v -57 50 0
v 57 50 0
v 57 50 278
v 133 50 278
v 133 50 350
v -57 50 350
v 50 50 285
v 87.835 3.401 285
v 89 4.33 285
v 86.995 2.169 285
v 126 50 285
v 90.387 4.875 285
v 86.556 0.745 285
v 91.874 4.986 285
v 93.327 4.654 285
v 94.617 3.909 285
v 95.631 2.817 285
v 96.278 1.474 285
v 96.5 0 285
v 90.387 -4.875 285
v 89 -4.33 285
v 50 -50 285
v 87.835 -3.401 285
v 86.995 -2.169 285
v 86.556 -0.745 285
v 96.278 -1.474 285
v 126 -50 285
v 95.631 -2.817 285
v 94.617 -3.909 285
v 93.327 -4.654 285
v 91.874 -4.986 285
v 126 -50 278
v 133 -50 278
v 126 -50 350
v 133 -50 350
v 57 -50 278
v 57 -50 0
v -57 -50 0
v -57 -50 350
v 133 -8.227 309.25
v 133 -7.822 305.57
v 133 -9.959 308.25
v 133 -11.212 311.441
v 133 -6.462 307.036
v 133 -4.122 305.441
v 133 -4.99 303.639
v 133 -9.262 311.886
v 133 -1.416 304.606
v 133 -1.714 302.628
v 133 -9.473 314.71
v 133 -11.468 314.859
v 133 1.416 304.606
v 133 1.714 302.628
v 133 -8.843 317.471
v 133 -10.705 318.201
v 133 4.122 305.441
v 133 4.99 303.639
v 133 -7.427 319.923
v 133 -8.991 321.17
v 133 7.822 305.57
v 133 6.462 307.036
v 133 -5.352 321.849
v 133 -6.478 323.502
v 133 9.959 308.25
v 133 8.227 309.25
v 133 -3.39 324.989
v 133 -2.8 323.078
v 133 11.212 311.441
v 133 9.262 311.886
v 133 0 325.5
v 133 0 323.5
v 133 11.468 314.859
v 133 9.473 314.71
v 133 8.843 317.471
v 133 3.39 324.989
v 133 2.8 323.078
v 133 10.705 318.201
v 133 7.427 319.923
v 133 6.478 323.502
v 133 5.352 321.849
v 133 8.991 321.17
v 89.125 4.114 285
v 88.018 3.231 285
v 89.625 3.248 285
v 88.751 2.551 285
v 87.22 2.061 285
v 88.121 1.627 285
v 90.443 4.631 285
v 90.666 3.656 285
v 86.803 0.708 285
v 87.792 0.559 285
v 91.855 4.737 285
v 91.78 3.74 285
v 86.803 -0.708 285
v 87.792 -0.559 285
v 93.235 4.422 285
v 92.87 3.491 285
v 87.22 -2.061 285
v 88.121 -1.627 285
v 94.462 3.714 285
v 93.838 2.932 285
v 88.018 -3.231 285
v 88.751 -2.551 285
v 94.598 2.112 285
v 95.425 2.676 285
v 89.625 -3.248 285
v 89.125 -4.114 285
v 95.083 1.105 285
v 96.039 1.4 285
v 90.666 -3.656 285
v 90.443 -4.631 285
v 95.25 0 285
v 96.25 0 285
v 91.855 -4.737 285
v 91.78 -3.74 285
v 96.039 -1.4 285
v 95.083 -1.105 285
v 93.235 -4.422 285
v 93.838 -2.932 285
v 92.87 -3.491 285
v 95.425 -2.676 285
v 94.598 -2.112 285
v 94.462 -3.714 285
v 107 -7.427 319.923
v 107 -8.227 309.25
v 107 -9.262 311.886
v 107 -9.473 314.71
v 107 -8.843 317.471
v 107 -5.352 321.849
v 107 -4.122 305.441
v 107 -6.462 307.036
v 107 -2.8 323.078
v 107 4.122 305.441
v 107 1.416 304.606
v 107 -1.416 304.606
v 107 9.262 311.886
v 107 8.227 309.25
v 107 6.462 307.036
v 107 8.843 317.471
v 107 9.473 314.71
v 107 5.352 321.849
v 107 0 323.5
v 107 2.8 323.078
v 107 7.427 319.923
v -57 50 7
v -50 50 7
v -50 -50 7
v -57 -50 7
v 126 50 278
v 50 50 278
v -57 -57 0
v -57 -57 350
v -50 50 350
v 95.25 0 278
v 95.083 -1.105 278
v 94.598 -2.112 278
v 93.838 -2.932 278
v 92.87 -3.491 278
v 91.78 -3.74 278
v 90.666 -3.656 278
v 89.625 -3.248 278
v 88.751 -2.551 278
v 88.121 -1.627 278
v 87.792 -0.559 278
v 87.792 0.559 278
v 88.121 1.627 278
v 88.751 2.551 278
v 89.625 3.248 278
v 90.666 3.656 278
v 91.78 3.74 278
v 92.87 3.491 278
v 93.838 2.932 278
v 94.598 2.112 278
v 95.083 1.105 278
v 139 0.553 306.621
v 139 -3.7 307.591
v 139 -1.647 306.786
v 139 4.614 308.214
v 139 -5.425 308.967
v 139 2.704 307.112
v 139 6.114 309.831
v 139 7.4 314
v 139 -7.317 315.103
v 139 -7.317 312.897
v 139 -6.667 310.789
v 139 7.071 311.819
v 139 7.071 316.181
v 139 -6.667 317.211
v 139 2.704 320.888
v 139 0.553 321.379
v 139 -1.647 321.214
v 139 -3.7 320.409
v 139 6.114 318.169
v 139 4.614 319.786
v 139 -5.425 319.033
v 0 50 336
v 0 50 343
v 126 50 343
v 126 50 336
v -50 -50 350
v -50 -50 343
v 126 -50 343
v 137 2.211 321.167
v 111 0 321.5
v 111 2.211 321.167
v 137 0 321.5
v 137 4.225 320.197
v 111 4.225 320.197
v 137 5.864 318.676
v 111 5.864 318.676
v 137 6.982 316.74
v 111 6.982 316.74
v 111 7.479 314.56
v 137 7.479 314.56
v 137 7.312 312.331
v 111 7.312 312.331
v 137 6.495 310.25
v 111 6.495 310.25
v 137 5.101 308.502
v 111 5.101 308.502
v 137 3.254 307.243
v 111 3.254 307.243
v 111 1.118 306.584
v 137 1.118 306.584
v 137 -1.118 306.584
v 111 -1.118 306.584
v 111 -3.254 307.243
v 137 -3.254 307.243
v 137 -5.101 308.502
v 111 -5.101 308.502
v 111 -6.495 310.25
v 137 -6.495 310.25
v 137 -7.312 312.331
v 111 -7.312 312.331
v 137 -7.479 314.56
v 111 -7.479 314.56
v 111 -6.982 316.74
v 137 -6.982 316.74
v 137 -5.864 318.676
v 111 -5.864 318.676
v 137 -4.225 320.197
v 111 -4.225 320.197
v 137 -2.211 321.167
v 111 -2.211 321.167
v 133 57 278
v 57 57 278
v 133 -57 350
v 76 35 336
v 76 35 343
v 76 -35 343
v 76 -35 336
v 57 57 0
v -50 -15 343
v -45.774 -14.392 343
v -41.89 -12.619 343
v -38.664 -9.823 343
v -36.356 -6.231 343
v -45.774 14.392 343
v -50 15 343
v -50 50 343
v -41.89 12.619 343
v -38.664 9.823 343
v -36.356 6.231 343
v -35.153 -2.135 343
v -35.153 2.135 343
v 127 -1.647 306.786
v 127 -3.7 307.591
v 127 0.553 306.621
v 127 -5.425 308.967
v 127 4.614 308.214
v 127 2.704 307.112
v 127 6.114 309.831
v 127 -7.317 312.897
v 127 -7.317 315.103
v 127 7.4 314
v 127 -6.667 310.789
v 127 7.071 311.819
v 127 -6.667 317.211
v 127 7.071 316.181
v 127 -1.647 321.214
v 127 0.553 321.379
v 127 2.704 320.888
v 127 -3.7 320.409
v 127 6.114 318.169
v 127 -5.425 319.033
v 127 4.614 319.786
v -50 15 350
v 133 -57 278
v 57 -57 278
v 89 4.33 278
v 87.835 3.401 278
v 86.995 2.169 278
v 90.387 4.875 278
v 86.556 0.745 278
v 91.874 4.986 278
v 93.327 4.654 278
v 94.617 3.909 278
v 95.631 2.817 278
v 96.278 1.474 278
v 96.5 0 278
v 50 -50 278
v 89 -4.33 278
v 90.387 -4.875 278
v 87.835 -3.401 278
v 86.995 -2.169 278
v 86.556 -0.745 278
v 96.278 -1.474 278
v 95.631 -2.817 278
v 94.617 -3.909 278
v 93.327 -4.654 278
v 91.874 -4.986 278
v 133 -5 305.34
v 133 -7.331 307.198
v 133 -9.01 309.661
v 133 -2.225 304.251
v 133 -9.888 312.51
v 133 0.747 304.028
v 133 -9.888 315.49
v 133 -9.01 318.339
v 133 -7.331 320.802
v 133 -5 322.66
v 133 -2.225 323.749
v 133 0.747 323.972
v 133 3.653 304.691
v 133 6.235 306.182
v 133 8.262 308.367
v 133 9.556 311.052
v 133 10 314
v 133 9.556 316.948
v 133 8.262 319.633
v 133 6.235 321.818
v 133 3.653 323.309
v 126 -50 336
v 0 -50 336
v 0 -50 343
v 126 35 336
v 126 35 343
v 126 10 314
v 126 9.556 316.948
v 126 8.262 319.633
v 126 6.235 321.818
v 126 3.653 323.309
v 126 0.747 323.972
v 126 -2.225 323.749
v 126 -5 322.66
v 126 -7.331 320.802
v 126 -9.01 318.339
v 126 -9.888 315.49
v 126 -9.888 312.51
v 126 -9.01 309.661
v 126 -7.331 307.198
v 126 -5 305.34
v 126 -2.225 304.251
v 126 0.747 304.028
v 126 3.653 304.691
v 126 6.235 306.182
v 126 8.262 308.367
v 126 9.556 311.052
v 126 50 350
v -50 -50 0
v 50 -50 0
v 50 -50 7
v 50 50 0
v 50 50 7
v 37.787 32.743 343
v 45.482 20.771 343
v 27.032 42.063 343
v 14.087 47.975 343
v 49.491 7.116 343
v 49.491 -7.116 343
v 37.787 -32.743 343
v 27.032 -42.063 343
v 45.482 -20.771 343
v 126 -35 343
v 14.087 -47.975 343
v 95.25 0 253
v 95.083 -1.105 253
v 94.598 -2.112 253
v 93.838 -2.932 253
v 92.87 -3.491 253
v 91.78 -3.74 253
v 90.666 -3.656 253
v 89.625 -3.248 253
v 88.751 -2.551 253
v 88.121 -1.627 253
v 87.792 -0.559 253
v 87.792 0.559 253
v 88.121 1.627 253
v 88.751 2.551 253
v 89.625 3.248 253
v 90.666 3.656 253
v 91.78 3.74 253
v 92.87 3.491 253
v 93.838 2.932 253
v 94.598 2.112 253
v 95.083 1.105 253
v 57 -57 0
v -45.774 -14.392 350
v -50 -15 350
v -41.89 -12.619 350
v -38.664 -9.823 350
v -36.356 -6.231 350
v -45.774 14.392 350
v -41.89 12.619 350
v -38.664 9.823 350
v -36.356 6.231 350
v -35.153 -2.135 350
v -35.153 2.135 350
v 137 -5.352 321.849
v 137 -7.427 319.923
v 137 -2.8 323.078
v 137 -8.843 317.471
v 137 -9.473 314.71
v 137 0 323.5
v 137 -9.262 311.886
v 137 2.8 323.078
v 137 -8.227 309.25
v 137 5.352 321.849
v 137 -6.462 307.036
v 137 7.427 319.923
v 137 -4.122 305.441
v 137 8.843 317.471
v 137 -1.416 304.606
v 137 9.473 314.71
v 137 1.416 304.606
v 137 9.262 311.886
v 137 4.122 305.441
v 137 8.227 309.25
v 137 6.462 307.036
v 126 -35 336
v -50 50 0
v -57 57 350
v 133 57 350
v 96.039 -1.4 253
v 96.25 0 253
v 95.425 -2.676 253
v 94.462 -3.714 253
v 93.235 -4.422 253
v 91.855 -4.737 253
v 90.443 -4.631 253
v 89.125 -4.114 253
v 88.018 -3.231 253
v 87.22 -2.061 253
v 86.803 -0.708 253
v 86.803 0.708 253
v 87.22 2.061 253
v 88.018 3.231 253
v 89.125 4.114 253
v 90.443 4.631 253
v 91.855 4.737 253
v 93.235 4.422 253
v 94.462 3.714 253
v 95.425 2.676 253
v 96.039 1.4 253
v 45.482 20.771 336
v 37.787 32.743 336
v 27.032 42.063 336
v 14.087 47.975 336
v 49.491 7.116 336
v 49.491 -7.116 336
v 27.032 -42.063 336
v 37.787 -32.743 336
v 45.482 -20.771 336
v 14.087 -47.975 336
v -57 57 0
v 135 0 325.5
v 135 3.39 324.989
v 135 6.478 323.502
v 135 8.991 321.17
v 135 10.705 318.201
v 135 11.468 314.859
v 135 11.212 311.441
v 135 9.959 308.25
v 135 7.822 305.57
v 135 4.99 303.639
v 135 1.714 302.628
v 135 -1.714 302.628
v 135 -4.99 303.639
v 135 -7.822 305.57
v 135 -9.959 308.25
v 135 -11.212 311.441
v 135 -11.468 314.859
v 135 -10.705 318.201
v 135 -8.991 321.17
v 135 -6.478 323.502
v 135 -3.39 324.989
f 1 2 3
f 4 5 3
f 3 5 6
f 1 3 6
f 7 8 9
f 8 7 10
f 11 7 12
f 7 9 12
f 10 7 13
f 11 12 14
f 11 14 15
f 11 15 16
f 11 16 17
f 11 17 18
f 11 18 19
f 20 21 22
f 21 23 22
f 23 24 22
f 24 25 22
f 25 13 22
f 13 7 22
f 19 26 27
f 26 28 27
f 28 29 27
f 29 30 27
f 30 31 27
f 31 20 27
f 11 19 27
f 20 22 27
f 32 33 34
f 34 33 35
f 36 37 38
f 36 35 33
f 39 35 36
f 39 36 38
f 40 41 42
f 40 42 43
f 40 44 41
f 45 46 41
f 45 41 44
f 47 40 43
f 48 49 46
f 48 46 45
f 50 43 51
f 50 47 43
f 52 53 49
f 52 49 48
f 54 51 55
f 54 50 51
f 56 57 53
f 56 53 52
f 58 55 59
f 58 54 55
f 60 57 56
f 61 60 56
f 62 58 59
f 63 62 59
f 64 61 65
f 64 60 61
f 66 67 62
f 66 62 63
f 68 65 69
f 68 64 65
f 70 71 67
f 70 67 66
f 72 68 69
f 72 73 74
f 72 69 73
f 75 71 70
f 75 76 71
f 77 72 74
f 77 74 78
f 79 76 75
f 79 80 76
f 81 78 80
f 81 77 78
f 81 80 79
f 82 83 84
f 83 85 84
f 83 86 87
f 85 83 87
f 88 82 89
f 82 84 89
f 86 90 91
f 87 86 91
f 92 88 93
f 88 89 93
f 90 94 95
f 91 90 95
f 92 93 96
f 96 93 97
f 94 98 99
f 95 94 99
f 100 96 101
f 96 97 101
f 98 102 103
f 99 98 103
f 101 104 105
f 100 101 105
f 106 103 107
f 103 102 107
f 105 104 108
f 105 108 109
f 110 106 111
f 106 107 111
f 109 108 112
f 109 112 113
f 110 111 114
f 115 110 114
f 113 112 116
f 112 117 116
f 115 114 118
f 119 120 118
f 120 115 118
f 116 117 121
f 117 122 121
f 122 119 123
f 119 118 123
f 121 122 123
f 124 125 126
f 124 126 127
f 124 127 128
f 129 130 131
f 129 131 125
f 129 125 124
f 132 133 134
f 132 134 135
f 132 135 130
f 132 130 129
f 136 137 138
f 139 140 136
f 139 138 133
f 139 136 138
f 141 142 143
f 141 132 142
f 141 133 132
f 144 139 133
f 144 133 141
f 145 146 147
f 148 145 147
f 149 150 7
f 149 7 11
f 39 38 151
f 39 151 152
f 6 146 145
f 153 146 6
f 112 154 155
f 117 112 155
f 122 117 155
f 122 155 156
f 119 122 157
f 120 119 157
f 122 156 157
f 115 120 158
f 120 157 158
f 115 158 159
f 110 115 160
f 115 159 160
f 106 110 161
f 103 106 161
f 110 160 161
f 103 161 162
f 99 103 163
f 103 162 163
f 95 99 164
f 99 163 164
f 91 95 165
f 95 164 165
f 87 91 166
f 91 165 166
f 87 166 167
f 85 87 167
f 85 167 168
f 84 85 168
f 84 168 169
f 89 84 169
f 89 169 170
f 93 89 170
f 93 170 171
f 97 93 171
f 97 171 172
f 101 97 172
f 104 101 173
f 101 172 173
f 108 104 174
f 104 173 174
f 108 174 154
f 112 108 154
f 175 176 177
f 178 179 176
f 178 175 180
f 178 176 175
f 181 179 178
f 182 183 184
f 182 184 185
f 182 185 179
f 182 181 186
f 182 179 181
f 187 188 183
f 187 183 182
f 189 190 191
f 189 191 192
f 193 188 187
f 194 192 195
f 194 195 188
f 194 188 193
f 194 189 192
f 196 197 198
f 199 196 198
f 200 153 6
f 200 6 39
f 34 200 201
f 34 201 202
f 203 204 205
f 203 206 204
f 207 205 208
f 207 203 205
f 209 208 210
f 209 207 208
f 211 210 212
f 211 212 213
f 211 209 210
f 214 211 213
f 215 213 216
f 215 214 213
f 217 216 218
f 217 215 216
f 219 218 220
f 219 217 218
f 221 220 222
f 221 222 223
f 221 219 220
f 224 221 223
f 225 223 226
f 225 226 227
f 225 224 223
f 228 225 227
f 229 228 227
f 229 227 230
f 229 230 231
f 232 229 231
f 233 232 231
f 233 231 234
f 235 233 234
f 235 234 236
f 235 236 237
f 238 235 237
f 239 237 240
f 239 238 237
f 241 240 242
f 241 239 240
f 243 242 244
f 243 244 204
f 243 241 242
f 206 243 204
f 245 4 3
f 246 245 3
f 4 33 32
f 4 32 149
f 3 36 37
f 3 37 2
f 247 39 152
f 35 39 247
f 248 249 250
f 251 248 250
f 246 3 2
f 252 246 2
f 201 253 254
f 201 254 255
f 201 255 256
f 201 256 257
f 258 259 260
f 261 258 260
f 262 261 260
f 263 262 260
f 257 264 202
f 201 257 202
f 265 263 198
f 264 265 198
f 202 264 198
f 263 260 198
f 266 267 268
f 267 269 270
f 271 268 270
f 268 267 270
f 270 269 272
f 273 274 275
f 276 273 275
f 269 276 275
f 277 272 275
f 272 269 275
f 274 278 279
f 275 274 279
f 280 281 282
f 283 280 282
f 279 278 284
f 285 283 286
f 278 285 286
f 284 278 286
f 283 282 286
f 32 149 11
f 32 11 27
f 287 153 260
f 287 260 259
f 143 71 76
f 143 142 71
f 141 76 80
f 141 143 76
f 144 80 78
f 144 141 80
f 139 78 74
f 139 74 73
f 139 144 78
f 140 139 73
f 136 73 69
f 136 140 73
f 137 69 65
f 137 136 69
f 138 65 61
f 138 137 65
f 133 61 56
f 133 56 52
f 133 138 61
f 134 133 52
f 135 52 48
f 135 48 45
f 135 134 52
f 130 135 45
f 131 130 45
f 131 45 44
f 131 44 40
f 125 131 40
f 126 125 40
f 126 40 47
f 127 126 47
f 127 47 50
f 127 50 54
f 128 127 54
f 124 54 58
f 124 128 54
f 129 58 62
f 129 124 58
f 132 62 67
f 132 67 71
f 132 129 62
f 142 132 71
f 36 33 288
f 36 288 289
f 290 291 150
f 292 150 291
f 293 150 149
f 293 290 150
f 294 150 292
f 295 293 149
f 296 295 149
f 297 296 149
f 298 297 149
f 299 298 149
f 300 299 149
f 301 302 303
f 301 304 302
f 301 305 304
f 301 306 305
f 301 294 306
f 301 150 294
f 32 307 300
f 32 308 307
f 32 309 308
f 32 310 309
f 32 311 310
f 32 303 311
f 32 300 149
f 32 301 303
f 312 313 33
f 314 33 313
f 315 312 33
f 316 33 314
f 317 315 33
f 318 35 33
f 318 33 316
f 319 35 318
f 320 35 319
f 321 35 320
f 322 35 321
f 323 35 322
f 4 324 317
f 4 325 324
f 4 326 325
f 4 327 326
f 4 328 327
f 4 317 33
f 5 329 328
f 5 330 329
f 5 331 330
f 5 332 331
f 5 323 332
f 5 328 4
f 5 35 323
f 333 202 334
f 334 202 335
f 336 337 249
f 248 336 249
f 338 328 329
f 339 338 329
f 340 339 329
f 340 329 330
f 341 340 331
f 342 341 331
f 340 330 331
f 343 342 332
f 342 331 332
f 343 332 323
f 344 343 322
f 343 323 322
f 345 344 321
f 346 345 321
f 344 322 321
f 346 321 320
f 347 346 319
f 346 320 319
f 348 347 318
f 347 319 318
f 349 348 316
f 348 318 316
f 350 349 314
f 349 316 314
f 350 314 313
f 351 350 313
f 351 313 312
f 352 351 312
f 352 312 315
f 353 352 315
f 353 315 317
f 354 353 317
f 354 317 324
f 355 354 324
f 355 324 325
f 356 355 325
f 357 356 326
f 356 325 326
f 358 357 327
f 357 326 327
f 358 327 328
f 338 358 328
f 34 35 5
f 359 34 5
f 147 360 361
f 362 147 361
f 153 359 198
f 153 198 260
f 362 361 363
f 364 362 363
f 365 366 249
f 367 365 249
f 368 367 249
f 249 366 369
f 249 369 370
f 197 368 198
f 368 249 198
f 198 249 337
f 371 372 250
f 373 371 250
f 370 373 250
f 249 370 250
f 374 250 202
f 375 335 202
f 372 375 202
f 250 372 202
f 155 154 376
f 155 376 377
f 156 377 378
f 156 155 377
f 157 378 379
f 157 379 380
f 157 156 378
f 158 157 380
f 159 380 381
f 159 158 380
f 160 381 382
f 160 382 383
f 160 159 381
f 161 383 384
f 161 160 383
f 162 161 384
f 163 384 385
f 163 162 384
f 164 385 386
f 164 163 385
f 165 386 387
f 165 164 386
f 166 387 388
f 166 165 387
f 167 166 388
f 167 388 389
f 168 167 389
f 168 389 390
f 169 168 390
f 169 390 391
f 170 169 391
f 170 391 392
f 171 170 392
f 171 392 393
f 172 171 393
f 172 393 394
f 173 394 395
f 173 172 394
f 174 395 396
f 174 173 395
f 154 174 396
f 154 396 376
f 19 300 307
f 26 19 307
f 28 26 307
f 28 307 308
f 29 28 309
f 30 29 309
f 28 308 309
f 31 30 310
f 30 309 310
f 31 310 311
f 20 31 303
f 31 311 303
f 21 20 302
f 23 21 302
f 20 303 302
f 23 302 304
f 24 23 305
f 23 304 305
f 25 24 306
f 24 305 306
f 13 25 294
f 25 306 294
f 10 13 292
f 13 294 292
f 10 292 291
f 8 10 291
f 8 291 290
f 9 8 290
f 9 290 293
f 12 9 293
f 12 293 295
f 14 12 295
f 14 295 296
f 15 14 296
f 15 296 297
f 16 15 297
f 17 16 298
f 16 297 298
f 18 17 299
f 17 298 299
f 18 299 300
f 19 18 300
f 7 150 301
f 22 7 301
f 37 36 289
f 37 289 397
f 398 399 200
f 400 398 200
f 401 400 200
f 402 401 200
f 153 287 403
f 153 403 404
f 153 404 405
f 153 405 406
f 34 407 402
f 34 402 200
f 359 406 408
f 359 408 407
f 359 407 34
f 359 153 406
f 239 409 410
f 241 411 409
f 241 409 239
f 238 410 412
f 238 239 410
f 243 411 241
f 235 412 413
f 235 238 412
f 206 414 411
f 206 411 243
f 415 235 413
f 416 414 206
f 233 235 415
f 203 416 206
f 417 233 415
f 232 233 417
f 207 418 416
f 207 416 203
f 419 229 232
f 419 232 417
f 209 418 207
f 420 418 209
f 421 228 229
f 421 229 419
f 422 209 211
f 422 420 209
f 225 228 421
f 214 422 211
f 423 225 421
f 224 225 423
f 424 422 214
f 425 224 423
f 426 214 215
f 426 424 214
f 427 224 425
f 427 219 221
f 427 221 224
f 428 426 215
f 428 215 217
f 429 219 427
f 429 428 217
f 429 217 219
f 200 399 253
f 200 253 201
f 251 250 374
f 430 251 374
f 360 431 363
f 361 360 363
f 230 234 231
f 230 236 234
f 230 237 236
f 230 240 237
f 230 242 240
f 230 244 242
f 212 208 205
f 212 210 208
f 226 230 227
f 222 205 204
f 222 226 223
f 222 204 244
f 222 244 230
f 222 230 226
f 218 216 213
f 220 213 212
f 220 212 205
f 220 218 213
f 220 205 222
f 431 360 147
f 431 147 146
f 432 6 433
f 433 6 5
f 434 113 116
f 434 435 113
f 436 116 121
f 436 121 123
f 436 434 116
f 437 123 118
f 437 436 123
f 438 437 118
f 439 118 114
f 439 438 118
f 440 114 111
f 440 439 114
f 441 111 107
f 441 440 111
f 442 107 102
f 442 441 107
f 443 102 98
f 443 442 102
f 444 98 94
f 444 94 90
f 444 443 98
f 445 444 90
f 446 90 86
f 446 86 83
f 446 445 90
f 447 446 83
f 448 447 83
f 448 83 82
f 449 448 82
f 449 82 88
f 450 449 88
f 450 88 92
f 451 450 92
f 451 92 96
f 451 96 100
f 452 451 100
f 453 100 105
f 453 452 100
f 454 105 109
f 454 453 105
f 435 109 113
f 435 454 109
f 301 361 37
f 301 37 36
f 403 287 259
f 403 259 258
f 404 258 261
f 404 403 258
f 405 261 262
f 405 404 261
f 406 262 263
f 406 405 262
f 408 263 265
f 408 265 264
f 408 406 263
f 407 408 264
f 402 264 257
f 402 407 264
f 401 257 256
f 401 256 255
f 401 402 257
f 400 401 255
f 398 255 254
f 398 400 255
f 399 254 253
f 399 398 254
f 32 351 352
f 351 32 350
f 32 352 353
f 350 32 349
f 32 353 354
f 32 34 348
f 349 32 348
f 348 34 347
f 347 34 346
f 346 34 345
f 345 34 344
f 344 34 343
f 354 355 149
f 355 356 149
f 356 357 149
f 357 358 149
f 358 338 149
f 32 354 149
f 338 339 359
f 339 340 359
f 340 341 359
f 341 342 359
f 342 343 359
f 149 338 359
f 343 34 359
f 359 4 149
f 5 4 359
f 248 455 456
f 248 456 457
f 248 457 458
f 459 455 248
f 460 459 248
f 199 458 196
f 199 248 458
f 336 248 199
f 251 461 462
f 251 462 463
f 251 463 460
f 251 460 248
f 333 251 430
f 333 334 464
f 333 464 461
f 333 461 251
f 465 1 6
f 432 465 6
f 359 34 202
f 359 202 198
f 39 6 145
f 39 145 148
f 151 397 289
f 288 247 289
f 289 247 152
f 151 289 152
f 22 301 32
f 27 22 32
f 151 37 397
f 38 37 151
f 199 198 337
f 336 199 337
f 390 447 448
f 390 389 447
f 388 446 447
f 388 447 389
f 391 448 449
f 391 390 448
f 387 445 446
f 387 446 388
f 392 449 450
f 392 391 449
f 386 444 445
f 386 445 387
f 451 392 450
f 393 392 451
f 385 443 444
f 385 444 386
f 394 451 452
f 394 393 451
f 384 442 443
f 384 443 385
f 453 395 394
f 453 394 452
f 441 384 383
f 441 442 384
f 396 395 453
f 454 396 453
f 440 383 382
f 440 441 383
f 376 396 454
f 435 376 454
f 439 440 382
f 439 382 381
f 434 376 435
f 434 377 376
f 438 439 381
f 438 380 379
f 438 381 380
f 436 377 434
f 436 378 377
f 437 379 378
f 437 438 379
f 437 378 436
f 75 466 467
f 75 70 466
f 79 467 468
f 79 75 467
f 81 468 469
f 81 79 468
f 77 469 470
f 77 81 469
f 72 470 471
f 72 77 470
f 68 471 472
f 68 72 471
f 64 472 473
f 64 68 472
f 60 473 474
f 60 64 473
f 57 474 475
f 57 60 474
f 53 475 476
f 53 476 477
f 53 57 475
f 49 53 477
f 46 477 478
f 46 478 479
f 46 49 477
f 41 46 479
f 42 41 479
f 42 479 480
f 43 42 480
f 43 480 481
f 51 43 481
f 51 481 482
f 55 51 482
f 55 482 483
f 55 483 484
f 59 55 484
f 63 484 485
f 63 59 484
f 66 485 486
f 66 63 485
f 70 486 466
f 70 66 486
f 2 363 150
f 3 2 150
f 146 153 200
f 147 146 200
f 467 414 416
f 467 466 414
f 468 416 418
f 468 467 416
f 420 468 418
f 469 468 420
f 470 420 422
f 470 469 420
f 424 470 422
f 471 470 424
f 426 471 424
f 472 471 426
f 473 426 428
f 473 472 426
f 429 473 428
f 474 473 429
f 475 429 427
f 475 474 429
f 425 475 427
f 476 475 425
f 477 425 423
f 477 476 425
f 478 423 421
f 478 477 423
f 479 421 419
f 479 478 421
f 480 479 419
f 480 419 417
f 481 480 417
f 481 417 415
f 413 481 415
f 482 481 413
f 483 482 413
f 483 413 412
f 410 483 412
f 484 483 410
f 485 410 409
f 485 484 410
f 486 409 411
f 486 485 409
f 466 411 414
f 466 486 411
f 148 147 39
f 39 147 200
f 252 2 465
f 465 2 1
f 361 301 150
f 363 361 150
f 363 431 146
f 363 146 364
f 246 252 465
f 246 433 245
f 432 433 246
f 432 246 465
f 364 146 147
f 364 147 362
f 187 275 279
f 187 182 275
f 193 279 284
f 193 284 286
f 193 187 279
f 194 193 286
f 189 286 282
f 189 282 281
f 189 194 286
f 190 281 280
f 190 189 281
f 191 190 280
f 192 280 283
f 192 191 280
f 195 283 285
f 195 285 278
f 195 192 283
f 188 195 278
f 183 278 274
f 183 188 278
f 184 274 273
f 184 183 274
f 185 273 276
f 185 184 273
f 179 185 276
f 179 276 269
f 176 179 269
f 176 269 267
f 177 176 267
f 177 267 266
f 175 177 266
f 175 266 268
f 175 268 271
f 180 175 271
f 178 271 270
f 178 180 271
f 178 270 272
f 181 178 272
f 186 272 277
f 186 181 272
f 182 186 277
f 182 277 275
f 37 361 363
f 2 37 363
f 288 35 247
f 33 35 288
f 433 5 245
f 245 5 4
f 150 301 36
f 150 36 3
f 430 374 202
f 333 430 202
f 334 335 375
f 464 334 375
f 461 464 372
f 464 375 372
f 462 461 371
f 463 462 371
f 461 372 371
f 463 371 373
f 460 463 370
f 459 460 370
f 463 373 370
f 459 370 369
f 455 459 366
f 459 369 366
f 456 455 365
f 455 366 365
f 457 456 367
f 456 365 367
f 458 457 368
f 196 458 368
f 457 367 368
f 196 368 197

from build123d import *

# Parameters (mm, degrees)
F0_W           = 100
F0_H           = 100
F1_DEPTH       = 7
F3_DEPTH       = 7
F4_START       = -100
F4_DEPTH       = 7
F5_W           = 100
F5_H           = 278
F6_DEPTH       = 7
F7_W           = 100
F7_H           = 343
F8_DEPTH       = 7
F9_W           = 100
F9_H           = 72
F9_R           = 10
F10_DEPTH      = 7
F12_DEPTH      = 7
F13_W          = 76
F13_H          = 100
F13_R          = 5
F14_DEPTH      = 7
F17_R          = 7.4
F18_DEPTH      = 2
F18_DEPTH_BACK = 10
F19_R          = 4.75
F19_R_2        = 3.75
F20_DEPTH      = 25
F20_DEPTH_BACK = 7
F22_DEPTH      = 7


with BuildPart() as f1:
    # F0 (on Top) → F1 (new body)
    with BuildSketch(Plane.XY):
        Rectangle(F0_W, F0_H)
    extrude(amount=F1_DEPTH)


with BuildPart() as f3:
    # F2 (on face) → F3 (new body)
    with BuildSketch(Plane(origin=(0, 50, 0), x_dir=(-1, 0, 0), z_dir=(0, 1, 0))):
        Polygon((-57, 278), (-57, 0), (57, 0), (57, 350), (-133, 350), (-133, 278), align=None)
    extrude(amount=F3_DEPTH)


with BuildPart() as f4:
    # F2 (on face) → F4 (new body)
    with BuildSketch(Plane(origin=(0, 50, 0), x_dir=(-1, 0, 0), z_dir=(0, 1, 0)).offset(F4_START)):
        Polygon((-57, 278), (-57, 0), (57, 0), (57, 350), (-133, 350), (-133, 278), align=None)
    extrude(amount=-F4_DEPTH)


with BuildPart() as f6:
    # F5 (on face) → F6 (new body)
    with BuildSketch(Plane.YZ.offset(50)):
        with Locations((0, 139)):
            Rectangle(F5_W, F5_H)
    extrude(amount=F6_DEPTH)


with BuildPart() as f8:
    # F7 (on face) → F8 (new body)
    with BuildSketch(Plane(origin=(-50, 0, 0), x_dir=(0, -1, 0), z_dir=(-1, 0, 0))):
        with Locations((0, 178.5)):
            Rectangle(F7_W, F7_H)
    extrude(amount=F8_DEPTH)


with BuildPart() as f10:
    # F9 (on face) → F10 (new body)
    with BuildSketch(Plane.YZ.offset(133)):
        with Locations((0, 314)):
            Rectangle(F9_W, F9_H)
        with Locations((0, 314)):
            Circle(F9_R, mode=Mode.SUBTRACT)
    extrude(amount=-F10_DEPTH)


with BuildPart() as f12:
    # F11 (on face) → F12 (new body)
    with BuildSketch(Plane.XY.offset(350)):
        with BuildLine():
            Line((-50, -15), (-50, -50))
            Line((-50, -50), (126, -50))
            Line((126, -50), (126, 50))
            Line((126, 50), (-50, 50))
            Line((-50, 50), (-50, 15))
            ThreePointArc((-50, 15), (-39.3933982822, 10.6066017178), (-35, 0))
            ThreePointArc((-35, 0), (-39.3933982822, -10.6066017178), (-50, -15))
        make_face()
    extrude(amount=-F12_DEPTH)


with BuildPart() as f14:
    # F13 (on face) → F14 (new body)
    with BuildSketch(Plane(origin=(0, 0, 278), x_dir=(1, 0, 0), z_dir=(0, 0, -1))):
        with Locations((88, 0)):
            Rectangle(F13_W, F13_H)
        with Locations((91.5, 0)):
            Circle(F13_R, mode=Mode.SUBTRACT)
    extrude(amount=-F14_DEPTH)


with BuildPart() as f16:
    # F15 (on Front) → F16 (revolve)
    with BuildSketch(Plane.XZ):
        Polygon((133, 325.5), (133, 323.5), (107, 323.5), (107, 314), (111, 314), (111, 321.5), (137, 321.5), (137, 323.5), (135, 325.5), align=None)
    revolve(axis=Axis((109, 0, 314), (-1, 0, 0)))


with BuildPart() as f18:
    # F17 (on face) → F18 (new body, two sides)
    with BuildSketch(Plane.YZ.offset(137)) as f18_sk:
        with Locations((0, 314)):
            Circle(F17_R)
    extrude(amount=F18_DEPTH)
    extrude(f18_sk.sketch, amount=-F18_DEPTH_BACK)


with BuildPart() as f20:
    # F19 (on face) → F20 (new body, two sides)
    with BuildSketch(Plane(origin=(0, 0, 278), x_dir=(1, 0, 0), z_dir=(0, 0, -1))) as f20_sk:
        with Locations((91.5, 0)):
            Circle(F19_R)
        with Locations((91.5, 0)):
            Circle(F19_R_2, mode=Mode.SUBTRACT)
    extrude(amount=F20_DEPTH)
    extrude(f20_sk.sketch, amount=-F20_DEPTH_BACK)


with BuildPart() as f22:
    # F21 (on face) → F22 (new body)
    with BuildSketch(Plane(origin=(0, 0, 343), x_dir=(1, 0, 0), z_dir=(0, 0, -1))):
        with BuildLine():
            ThreePointArc((50, 0), (35.3553390593, -35.3553390593), (0, -50))
            Line((0, -50), (126, -50))
            Line((126, -50), (126, -35))
            Line((126, -35), (76, -35))
            Line((76, -35), (76, 35))
            Line((76, 35), (126, 35))
            Line((126, 35), (126, 50))
            Line((126, 50), (3.1482449267, 50))
            Line((3.1482449267, 50), (6.44e-08, 50))
            ThreePointArc((6.44e-08, 50), (35.3553390821, 35.3553390366), (50, 0))
        make_face()
    extrude(amount=F22_DEPTH)


solid = Compound([f1.part, f3.part, f4.part, f6.part, f8.part, f10.part, f12.part, f14.part, f16.part, f18.part, f20.part, f22.part])
